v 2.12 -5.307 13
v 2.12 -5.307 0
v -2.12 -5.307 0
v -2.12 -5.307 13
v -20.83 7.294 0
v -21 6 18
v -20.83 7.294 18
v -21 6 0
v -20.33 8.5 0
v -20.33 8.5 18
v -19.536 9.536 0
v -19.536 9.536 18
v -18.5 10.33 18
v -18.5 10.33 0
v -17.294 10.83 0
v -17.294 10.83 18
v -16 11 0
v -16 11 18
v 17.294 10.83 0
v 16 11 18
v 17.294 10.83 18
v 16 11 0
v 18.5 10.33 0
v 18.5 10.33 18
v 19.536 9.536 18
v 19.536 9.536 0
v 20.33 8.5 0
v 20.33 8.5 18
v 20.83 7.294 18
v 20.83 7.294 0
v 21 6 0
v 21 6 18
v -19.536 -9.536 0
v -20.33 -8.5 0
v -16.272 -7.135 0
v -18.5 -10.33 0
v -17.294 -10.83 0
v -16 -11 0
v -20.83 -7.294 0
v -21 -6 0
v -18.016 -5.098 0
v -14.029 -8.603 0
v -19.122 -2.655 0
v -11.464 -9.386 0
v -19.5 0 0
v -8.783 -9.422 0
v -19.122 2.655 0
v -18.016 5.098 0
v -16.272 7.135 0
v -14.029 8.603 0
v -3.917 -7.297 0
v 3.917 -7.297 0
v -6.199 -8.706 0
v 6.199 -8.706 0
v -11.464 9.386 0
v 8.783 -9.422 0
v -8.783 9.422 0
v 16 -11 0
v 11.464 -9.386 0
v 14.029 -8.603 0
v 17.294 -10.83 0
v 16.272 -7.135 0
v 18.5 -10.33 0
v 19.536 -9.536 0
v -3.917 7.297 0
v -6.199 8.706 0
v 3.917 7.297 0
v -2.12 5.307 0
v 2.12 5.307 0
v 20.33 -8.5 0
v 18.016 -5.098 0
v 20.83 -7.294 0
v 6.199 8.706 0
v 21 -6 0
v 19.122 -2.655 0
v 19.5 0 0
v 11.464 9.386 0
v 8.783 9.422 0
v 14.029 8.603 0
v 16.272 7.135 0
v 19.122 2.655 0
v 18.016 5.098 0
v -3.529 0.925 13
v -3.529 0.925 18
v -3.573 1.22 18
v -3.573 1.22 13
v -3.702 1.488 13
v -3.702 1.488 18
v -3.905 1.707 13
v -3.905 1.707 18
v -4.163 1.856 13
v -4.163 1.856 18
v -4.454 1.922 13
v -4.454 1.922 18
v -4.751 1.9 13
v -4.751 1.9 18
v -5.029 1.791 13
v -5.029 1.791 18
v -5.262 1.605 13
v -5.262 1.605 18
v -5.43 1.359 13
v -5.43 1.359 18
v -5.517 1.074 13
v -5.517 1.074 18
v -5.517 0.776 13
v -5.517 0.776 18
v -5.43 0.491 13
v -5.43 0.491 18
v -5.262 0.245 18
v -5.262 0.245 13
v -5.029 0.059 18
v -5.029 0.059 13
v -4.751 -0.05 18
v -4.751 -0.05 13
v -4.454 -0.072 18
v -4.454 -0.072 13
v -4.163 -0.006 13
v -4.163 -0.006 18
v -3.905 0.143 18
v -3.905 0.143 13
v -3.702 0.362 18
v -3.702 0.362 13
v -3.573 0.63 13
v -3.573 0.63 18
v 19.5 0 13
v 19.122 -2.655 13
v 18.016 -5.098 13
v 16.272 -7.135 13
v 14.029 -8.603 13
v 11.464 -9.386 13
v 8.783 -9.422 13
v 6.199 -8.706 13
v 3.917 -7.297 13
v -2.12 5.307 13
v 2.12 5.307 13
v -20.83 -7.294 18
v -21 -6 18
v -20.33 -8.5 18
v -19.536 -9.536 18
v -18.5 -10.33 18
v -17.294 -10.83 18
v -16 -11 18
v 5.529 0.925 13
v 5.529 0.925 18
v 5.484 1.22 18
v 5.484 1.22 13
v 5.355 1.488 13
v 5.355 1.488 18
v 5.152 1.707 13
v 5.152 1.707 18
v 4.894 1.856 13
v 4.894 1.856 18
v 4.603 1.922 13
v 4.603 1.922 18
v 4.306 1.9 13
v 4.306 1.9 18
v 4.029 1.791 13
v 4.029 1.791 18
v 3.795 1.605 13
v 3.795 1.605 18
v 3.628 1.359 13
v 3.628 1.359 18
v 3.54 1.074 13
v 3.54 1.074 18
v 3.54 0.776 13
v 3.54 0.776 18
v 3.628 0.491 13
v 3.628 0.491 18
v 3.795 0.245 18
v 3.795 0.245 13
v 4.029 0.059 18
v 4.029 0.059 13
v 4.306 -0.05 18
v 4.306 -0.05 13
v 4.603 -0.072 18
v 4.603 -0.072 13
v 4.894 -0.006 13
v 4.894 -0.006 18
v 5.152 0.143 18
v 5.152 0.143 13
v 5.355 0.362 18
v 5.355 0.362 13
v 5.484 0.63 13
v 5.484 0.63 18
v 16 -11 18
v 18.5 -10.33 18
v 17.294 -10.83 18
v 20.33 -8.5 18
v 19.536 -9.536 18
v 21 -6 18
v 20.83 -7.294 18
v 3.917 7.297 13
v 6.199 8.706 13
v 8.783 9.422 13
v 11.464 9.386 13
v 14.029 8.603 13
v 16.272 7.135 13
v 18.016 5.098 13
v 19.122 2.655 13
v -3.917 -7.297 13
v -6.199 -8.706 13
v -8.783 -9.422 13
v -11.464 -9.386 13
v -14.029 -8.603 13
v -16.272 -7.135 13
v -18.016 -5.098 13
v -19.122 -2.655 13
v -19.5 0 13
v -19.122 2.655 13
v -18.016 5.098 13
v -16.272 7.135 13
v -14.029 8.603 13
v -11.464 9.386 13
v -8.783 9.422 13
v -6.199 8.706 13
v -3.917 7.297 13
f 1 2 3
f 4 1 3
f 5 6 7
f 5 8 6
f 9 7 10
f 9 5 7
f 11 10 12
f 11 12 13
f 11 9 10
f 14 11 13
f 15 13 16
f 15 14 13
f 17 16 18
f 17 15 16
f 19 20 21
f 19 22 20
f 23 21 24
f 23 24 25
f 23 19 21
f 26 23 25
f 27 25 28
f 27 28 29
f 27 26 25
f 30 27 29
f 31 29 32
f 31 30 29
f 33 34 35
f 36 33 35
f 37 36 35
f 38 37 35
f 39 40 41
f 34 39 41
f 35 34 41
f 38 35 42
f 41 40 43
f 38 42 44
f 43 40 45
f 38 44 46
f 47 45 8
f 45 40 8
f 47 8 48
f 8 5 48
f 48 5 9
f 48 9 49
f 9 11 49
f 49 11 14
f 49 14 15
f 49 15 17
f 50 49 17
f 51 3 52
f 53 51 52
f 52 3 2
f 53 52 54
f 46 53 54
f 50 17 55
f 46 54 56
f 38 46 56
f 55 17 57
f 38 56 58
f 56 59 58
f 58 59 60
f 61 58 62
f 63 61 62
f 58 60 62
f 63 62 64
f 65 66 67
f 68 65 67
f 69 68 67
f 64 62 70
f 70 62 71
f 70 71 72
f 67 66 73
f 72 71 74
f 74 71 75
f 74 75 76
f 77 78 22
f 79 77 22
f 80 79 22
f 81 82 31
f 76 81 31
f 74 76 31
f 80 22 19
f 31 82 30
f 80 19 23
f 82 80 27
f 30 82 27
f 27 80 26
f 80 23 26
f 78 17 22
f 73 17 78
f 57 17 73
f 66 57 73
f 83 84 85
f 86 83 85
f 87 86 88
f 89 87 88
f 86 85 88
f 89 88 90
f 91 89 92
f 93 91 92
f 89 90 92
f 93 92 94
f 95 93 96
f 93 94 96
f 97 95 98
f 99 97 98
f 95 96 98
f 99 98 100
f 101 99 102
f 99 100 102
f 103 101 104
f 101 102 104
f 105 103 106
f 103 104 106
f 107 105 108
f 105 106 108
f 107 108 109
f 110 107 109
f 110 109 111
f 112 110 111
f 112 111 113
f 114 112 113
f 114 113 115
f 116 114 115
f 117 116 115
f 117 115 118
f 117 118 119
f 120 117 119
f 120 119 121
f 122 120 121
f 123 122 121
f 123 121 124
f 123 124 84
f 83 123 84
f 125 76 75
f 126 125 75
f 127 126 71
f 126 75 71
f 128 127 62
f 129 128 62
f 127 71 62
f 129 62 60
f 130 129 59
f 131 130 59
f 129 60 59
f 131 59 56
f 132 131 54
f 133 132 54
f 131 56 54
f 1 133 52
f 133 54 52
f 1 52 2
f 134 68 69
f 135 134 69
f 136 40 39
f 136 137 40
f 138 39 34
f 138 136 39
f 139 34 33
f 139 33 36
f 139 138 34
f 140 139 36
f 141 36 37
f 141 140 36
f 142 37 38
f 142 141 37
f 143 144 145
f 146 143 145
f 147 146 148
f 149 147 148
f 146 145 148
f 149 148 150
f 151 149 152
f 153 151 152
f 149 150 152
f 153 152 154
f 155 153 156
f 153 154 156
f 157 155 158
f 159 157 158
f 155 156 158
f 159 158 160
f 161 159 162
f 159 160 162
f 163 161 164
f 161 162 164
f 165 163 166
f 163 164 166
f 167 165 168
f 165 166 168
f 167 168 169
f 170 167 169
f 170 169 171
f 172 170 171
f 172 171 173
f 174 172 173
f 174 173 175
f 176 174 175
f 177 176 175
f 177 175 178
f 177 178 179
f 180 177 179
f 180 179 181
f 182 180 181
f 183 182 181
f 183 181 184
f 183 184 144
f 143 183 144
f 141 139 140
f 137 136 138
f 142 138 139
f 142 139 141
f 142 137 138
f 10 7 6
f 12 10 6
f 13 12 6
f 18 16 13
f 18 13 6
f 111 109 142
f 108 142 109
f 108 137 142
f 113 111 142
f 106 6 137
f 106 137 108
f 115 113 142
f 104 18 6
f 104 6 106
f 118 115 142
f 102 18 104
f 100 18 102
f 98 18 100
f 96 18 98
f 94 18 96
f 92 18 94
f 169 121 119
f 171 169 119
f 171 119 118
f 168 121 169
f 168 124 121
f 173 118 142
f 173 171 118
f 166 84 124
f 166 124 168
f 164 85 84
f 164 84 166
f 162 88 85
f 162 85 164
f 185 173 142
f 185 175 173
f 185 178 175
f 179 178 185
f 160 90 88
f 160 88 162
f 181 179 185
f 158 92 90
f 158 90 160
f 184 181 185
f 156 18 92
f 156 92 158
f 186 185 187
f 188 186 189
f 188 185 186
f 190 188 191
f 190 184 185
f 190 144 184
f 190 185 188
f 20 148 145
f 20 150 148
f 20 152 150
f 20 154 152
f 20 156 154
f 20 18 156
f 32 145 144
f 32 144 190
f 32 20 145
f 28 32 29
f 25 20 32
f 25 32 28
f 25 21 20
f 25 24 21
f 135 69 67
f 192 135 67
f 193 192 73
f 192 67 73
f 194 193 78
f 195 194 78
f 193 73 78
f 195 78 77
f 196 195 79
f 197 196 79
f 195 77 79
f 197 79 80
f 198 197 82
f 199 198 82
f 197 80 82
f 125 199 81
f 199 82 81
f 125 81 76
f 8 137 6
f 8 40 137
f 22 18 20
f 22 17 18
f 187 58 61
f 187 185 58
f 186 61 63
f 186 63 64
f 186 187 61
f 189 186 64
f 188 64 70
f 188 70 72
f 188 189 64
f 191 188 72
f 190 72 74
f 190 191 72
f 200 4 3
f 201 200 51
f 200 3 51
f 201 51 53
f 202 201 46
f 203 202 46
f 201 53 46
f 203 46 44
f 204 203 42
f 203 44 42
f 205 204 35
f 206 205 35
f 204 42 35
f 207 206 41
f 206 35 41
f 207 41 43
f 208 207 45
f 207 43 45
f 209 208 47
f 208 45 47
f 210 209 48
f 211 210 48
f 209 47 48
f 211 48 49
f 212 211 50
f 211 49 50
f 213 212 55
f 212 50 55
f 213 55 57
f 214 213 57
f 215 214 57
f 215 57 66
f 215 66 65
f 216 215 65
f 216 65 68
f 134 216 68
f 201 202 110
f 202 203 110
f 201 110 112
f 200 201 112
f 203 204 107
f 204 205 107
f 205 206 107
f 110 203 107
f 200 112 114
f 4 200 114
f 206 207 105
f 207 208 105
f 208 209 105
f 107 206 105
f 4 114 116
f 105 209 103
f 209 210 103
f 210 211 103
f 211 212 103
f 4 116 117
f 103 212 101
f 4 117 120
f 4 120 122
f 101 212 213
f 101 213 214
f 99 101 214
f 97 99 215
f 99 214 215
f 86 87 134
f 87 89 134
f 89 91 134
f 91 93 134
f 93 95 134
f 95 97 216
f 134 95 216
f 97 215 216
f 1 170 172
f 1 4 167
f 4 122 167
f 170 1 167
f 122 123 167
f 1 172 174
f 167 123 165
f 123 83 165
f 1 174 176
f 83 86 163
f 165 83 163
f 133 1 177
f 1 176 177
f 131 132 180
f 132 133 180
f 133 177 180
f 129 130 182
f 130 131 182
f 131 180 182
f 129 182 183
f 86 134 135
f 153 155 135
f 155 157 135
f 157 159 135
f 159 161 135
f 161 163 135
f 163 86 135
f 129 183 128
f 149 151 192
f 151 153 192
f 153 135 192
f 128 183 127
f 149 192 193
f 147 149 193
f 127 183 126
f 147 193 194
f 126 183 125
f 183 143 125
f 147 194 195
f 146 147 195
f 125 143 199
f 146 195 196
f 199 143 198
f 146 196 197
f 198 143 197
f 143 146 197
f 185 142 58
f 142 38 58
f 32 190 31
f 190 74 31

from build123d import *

# Parameters (mm, degrees)
F0_W     = 42
F0_H     = 22
F1_DEPTH = 13
F2_W     = 42
F2_H     = 22
F3_DEPTH = 5
F4_R     = 1
F5_DEPTH = 6
F6_R     = 5


with BuildPart() as f1:
    # F0 (on Top) → F1 (new body)
    with BuildSketch(Plane.XY):
        Rectangle(F0_W, F0_H)
        with BuildLine():
            ThreePointArc((-2.120368, -5.306732), (-19.5, 0), (-2.120368, 5.306732))
            Line((-2.120368, 5.306732), (2.120368, 5.306732))
            ThreePointArc((2.120368, 5.306732), (12.774302, 9.085882), (19.5, 0))
            ThreePointArc((19.5, 0), (12.774302, -9.085882), (2.120368, -5.306732))
            Line((2.120368, -5.306732), (-2.120368, -5.306732))
        make_face(mode=Mode.SUBTRACT)
    extrude(amount=F1_DEPTH)

    # F2 (on face) → F3 (join)
    with BuildSketch(Plane.XY.offset(13)):
        Rectangle(F2_W, F2_H)
    extrude(amount=F3_DEPTH)

    # F4 (on face) → F5 (cut)
    with BuildSketch(Plane.XY.offset(18)):
        with Locations((-4.52854, 0.924871)):
            Circle(F4_R)
        with Locations((4.52854, 0.924871)):
            Circle(F4_R)
    extrude(amount=-F5_DEPTH, mode=Mode.SUBTRACT)

    # F6
    f6_edges = [f1.edges().sort_by_distance(p)[0] for p in [
        (-21, -11, 9),
        (21, -11, 9),
        (-21, 11, 9),
        (21, 11, 9),
    ]]
    fillet(f6_edges, radius=F6_R)


solid = f1.part
